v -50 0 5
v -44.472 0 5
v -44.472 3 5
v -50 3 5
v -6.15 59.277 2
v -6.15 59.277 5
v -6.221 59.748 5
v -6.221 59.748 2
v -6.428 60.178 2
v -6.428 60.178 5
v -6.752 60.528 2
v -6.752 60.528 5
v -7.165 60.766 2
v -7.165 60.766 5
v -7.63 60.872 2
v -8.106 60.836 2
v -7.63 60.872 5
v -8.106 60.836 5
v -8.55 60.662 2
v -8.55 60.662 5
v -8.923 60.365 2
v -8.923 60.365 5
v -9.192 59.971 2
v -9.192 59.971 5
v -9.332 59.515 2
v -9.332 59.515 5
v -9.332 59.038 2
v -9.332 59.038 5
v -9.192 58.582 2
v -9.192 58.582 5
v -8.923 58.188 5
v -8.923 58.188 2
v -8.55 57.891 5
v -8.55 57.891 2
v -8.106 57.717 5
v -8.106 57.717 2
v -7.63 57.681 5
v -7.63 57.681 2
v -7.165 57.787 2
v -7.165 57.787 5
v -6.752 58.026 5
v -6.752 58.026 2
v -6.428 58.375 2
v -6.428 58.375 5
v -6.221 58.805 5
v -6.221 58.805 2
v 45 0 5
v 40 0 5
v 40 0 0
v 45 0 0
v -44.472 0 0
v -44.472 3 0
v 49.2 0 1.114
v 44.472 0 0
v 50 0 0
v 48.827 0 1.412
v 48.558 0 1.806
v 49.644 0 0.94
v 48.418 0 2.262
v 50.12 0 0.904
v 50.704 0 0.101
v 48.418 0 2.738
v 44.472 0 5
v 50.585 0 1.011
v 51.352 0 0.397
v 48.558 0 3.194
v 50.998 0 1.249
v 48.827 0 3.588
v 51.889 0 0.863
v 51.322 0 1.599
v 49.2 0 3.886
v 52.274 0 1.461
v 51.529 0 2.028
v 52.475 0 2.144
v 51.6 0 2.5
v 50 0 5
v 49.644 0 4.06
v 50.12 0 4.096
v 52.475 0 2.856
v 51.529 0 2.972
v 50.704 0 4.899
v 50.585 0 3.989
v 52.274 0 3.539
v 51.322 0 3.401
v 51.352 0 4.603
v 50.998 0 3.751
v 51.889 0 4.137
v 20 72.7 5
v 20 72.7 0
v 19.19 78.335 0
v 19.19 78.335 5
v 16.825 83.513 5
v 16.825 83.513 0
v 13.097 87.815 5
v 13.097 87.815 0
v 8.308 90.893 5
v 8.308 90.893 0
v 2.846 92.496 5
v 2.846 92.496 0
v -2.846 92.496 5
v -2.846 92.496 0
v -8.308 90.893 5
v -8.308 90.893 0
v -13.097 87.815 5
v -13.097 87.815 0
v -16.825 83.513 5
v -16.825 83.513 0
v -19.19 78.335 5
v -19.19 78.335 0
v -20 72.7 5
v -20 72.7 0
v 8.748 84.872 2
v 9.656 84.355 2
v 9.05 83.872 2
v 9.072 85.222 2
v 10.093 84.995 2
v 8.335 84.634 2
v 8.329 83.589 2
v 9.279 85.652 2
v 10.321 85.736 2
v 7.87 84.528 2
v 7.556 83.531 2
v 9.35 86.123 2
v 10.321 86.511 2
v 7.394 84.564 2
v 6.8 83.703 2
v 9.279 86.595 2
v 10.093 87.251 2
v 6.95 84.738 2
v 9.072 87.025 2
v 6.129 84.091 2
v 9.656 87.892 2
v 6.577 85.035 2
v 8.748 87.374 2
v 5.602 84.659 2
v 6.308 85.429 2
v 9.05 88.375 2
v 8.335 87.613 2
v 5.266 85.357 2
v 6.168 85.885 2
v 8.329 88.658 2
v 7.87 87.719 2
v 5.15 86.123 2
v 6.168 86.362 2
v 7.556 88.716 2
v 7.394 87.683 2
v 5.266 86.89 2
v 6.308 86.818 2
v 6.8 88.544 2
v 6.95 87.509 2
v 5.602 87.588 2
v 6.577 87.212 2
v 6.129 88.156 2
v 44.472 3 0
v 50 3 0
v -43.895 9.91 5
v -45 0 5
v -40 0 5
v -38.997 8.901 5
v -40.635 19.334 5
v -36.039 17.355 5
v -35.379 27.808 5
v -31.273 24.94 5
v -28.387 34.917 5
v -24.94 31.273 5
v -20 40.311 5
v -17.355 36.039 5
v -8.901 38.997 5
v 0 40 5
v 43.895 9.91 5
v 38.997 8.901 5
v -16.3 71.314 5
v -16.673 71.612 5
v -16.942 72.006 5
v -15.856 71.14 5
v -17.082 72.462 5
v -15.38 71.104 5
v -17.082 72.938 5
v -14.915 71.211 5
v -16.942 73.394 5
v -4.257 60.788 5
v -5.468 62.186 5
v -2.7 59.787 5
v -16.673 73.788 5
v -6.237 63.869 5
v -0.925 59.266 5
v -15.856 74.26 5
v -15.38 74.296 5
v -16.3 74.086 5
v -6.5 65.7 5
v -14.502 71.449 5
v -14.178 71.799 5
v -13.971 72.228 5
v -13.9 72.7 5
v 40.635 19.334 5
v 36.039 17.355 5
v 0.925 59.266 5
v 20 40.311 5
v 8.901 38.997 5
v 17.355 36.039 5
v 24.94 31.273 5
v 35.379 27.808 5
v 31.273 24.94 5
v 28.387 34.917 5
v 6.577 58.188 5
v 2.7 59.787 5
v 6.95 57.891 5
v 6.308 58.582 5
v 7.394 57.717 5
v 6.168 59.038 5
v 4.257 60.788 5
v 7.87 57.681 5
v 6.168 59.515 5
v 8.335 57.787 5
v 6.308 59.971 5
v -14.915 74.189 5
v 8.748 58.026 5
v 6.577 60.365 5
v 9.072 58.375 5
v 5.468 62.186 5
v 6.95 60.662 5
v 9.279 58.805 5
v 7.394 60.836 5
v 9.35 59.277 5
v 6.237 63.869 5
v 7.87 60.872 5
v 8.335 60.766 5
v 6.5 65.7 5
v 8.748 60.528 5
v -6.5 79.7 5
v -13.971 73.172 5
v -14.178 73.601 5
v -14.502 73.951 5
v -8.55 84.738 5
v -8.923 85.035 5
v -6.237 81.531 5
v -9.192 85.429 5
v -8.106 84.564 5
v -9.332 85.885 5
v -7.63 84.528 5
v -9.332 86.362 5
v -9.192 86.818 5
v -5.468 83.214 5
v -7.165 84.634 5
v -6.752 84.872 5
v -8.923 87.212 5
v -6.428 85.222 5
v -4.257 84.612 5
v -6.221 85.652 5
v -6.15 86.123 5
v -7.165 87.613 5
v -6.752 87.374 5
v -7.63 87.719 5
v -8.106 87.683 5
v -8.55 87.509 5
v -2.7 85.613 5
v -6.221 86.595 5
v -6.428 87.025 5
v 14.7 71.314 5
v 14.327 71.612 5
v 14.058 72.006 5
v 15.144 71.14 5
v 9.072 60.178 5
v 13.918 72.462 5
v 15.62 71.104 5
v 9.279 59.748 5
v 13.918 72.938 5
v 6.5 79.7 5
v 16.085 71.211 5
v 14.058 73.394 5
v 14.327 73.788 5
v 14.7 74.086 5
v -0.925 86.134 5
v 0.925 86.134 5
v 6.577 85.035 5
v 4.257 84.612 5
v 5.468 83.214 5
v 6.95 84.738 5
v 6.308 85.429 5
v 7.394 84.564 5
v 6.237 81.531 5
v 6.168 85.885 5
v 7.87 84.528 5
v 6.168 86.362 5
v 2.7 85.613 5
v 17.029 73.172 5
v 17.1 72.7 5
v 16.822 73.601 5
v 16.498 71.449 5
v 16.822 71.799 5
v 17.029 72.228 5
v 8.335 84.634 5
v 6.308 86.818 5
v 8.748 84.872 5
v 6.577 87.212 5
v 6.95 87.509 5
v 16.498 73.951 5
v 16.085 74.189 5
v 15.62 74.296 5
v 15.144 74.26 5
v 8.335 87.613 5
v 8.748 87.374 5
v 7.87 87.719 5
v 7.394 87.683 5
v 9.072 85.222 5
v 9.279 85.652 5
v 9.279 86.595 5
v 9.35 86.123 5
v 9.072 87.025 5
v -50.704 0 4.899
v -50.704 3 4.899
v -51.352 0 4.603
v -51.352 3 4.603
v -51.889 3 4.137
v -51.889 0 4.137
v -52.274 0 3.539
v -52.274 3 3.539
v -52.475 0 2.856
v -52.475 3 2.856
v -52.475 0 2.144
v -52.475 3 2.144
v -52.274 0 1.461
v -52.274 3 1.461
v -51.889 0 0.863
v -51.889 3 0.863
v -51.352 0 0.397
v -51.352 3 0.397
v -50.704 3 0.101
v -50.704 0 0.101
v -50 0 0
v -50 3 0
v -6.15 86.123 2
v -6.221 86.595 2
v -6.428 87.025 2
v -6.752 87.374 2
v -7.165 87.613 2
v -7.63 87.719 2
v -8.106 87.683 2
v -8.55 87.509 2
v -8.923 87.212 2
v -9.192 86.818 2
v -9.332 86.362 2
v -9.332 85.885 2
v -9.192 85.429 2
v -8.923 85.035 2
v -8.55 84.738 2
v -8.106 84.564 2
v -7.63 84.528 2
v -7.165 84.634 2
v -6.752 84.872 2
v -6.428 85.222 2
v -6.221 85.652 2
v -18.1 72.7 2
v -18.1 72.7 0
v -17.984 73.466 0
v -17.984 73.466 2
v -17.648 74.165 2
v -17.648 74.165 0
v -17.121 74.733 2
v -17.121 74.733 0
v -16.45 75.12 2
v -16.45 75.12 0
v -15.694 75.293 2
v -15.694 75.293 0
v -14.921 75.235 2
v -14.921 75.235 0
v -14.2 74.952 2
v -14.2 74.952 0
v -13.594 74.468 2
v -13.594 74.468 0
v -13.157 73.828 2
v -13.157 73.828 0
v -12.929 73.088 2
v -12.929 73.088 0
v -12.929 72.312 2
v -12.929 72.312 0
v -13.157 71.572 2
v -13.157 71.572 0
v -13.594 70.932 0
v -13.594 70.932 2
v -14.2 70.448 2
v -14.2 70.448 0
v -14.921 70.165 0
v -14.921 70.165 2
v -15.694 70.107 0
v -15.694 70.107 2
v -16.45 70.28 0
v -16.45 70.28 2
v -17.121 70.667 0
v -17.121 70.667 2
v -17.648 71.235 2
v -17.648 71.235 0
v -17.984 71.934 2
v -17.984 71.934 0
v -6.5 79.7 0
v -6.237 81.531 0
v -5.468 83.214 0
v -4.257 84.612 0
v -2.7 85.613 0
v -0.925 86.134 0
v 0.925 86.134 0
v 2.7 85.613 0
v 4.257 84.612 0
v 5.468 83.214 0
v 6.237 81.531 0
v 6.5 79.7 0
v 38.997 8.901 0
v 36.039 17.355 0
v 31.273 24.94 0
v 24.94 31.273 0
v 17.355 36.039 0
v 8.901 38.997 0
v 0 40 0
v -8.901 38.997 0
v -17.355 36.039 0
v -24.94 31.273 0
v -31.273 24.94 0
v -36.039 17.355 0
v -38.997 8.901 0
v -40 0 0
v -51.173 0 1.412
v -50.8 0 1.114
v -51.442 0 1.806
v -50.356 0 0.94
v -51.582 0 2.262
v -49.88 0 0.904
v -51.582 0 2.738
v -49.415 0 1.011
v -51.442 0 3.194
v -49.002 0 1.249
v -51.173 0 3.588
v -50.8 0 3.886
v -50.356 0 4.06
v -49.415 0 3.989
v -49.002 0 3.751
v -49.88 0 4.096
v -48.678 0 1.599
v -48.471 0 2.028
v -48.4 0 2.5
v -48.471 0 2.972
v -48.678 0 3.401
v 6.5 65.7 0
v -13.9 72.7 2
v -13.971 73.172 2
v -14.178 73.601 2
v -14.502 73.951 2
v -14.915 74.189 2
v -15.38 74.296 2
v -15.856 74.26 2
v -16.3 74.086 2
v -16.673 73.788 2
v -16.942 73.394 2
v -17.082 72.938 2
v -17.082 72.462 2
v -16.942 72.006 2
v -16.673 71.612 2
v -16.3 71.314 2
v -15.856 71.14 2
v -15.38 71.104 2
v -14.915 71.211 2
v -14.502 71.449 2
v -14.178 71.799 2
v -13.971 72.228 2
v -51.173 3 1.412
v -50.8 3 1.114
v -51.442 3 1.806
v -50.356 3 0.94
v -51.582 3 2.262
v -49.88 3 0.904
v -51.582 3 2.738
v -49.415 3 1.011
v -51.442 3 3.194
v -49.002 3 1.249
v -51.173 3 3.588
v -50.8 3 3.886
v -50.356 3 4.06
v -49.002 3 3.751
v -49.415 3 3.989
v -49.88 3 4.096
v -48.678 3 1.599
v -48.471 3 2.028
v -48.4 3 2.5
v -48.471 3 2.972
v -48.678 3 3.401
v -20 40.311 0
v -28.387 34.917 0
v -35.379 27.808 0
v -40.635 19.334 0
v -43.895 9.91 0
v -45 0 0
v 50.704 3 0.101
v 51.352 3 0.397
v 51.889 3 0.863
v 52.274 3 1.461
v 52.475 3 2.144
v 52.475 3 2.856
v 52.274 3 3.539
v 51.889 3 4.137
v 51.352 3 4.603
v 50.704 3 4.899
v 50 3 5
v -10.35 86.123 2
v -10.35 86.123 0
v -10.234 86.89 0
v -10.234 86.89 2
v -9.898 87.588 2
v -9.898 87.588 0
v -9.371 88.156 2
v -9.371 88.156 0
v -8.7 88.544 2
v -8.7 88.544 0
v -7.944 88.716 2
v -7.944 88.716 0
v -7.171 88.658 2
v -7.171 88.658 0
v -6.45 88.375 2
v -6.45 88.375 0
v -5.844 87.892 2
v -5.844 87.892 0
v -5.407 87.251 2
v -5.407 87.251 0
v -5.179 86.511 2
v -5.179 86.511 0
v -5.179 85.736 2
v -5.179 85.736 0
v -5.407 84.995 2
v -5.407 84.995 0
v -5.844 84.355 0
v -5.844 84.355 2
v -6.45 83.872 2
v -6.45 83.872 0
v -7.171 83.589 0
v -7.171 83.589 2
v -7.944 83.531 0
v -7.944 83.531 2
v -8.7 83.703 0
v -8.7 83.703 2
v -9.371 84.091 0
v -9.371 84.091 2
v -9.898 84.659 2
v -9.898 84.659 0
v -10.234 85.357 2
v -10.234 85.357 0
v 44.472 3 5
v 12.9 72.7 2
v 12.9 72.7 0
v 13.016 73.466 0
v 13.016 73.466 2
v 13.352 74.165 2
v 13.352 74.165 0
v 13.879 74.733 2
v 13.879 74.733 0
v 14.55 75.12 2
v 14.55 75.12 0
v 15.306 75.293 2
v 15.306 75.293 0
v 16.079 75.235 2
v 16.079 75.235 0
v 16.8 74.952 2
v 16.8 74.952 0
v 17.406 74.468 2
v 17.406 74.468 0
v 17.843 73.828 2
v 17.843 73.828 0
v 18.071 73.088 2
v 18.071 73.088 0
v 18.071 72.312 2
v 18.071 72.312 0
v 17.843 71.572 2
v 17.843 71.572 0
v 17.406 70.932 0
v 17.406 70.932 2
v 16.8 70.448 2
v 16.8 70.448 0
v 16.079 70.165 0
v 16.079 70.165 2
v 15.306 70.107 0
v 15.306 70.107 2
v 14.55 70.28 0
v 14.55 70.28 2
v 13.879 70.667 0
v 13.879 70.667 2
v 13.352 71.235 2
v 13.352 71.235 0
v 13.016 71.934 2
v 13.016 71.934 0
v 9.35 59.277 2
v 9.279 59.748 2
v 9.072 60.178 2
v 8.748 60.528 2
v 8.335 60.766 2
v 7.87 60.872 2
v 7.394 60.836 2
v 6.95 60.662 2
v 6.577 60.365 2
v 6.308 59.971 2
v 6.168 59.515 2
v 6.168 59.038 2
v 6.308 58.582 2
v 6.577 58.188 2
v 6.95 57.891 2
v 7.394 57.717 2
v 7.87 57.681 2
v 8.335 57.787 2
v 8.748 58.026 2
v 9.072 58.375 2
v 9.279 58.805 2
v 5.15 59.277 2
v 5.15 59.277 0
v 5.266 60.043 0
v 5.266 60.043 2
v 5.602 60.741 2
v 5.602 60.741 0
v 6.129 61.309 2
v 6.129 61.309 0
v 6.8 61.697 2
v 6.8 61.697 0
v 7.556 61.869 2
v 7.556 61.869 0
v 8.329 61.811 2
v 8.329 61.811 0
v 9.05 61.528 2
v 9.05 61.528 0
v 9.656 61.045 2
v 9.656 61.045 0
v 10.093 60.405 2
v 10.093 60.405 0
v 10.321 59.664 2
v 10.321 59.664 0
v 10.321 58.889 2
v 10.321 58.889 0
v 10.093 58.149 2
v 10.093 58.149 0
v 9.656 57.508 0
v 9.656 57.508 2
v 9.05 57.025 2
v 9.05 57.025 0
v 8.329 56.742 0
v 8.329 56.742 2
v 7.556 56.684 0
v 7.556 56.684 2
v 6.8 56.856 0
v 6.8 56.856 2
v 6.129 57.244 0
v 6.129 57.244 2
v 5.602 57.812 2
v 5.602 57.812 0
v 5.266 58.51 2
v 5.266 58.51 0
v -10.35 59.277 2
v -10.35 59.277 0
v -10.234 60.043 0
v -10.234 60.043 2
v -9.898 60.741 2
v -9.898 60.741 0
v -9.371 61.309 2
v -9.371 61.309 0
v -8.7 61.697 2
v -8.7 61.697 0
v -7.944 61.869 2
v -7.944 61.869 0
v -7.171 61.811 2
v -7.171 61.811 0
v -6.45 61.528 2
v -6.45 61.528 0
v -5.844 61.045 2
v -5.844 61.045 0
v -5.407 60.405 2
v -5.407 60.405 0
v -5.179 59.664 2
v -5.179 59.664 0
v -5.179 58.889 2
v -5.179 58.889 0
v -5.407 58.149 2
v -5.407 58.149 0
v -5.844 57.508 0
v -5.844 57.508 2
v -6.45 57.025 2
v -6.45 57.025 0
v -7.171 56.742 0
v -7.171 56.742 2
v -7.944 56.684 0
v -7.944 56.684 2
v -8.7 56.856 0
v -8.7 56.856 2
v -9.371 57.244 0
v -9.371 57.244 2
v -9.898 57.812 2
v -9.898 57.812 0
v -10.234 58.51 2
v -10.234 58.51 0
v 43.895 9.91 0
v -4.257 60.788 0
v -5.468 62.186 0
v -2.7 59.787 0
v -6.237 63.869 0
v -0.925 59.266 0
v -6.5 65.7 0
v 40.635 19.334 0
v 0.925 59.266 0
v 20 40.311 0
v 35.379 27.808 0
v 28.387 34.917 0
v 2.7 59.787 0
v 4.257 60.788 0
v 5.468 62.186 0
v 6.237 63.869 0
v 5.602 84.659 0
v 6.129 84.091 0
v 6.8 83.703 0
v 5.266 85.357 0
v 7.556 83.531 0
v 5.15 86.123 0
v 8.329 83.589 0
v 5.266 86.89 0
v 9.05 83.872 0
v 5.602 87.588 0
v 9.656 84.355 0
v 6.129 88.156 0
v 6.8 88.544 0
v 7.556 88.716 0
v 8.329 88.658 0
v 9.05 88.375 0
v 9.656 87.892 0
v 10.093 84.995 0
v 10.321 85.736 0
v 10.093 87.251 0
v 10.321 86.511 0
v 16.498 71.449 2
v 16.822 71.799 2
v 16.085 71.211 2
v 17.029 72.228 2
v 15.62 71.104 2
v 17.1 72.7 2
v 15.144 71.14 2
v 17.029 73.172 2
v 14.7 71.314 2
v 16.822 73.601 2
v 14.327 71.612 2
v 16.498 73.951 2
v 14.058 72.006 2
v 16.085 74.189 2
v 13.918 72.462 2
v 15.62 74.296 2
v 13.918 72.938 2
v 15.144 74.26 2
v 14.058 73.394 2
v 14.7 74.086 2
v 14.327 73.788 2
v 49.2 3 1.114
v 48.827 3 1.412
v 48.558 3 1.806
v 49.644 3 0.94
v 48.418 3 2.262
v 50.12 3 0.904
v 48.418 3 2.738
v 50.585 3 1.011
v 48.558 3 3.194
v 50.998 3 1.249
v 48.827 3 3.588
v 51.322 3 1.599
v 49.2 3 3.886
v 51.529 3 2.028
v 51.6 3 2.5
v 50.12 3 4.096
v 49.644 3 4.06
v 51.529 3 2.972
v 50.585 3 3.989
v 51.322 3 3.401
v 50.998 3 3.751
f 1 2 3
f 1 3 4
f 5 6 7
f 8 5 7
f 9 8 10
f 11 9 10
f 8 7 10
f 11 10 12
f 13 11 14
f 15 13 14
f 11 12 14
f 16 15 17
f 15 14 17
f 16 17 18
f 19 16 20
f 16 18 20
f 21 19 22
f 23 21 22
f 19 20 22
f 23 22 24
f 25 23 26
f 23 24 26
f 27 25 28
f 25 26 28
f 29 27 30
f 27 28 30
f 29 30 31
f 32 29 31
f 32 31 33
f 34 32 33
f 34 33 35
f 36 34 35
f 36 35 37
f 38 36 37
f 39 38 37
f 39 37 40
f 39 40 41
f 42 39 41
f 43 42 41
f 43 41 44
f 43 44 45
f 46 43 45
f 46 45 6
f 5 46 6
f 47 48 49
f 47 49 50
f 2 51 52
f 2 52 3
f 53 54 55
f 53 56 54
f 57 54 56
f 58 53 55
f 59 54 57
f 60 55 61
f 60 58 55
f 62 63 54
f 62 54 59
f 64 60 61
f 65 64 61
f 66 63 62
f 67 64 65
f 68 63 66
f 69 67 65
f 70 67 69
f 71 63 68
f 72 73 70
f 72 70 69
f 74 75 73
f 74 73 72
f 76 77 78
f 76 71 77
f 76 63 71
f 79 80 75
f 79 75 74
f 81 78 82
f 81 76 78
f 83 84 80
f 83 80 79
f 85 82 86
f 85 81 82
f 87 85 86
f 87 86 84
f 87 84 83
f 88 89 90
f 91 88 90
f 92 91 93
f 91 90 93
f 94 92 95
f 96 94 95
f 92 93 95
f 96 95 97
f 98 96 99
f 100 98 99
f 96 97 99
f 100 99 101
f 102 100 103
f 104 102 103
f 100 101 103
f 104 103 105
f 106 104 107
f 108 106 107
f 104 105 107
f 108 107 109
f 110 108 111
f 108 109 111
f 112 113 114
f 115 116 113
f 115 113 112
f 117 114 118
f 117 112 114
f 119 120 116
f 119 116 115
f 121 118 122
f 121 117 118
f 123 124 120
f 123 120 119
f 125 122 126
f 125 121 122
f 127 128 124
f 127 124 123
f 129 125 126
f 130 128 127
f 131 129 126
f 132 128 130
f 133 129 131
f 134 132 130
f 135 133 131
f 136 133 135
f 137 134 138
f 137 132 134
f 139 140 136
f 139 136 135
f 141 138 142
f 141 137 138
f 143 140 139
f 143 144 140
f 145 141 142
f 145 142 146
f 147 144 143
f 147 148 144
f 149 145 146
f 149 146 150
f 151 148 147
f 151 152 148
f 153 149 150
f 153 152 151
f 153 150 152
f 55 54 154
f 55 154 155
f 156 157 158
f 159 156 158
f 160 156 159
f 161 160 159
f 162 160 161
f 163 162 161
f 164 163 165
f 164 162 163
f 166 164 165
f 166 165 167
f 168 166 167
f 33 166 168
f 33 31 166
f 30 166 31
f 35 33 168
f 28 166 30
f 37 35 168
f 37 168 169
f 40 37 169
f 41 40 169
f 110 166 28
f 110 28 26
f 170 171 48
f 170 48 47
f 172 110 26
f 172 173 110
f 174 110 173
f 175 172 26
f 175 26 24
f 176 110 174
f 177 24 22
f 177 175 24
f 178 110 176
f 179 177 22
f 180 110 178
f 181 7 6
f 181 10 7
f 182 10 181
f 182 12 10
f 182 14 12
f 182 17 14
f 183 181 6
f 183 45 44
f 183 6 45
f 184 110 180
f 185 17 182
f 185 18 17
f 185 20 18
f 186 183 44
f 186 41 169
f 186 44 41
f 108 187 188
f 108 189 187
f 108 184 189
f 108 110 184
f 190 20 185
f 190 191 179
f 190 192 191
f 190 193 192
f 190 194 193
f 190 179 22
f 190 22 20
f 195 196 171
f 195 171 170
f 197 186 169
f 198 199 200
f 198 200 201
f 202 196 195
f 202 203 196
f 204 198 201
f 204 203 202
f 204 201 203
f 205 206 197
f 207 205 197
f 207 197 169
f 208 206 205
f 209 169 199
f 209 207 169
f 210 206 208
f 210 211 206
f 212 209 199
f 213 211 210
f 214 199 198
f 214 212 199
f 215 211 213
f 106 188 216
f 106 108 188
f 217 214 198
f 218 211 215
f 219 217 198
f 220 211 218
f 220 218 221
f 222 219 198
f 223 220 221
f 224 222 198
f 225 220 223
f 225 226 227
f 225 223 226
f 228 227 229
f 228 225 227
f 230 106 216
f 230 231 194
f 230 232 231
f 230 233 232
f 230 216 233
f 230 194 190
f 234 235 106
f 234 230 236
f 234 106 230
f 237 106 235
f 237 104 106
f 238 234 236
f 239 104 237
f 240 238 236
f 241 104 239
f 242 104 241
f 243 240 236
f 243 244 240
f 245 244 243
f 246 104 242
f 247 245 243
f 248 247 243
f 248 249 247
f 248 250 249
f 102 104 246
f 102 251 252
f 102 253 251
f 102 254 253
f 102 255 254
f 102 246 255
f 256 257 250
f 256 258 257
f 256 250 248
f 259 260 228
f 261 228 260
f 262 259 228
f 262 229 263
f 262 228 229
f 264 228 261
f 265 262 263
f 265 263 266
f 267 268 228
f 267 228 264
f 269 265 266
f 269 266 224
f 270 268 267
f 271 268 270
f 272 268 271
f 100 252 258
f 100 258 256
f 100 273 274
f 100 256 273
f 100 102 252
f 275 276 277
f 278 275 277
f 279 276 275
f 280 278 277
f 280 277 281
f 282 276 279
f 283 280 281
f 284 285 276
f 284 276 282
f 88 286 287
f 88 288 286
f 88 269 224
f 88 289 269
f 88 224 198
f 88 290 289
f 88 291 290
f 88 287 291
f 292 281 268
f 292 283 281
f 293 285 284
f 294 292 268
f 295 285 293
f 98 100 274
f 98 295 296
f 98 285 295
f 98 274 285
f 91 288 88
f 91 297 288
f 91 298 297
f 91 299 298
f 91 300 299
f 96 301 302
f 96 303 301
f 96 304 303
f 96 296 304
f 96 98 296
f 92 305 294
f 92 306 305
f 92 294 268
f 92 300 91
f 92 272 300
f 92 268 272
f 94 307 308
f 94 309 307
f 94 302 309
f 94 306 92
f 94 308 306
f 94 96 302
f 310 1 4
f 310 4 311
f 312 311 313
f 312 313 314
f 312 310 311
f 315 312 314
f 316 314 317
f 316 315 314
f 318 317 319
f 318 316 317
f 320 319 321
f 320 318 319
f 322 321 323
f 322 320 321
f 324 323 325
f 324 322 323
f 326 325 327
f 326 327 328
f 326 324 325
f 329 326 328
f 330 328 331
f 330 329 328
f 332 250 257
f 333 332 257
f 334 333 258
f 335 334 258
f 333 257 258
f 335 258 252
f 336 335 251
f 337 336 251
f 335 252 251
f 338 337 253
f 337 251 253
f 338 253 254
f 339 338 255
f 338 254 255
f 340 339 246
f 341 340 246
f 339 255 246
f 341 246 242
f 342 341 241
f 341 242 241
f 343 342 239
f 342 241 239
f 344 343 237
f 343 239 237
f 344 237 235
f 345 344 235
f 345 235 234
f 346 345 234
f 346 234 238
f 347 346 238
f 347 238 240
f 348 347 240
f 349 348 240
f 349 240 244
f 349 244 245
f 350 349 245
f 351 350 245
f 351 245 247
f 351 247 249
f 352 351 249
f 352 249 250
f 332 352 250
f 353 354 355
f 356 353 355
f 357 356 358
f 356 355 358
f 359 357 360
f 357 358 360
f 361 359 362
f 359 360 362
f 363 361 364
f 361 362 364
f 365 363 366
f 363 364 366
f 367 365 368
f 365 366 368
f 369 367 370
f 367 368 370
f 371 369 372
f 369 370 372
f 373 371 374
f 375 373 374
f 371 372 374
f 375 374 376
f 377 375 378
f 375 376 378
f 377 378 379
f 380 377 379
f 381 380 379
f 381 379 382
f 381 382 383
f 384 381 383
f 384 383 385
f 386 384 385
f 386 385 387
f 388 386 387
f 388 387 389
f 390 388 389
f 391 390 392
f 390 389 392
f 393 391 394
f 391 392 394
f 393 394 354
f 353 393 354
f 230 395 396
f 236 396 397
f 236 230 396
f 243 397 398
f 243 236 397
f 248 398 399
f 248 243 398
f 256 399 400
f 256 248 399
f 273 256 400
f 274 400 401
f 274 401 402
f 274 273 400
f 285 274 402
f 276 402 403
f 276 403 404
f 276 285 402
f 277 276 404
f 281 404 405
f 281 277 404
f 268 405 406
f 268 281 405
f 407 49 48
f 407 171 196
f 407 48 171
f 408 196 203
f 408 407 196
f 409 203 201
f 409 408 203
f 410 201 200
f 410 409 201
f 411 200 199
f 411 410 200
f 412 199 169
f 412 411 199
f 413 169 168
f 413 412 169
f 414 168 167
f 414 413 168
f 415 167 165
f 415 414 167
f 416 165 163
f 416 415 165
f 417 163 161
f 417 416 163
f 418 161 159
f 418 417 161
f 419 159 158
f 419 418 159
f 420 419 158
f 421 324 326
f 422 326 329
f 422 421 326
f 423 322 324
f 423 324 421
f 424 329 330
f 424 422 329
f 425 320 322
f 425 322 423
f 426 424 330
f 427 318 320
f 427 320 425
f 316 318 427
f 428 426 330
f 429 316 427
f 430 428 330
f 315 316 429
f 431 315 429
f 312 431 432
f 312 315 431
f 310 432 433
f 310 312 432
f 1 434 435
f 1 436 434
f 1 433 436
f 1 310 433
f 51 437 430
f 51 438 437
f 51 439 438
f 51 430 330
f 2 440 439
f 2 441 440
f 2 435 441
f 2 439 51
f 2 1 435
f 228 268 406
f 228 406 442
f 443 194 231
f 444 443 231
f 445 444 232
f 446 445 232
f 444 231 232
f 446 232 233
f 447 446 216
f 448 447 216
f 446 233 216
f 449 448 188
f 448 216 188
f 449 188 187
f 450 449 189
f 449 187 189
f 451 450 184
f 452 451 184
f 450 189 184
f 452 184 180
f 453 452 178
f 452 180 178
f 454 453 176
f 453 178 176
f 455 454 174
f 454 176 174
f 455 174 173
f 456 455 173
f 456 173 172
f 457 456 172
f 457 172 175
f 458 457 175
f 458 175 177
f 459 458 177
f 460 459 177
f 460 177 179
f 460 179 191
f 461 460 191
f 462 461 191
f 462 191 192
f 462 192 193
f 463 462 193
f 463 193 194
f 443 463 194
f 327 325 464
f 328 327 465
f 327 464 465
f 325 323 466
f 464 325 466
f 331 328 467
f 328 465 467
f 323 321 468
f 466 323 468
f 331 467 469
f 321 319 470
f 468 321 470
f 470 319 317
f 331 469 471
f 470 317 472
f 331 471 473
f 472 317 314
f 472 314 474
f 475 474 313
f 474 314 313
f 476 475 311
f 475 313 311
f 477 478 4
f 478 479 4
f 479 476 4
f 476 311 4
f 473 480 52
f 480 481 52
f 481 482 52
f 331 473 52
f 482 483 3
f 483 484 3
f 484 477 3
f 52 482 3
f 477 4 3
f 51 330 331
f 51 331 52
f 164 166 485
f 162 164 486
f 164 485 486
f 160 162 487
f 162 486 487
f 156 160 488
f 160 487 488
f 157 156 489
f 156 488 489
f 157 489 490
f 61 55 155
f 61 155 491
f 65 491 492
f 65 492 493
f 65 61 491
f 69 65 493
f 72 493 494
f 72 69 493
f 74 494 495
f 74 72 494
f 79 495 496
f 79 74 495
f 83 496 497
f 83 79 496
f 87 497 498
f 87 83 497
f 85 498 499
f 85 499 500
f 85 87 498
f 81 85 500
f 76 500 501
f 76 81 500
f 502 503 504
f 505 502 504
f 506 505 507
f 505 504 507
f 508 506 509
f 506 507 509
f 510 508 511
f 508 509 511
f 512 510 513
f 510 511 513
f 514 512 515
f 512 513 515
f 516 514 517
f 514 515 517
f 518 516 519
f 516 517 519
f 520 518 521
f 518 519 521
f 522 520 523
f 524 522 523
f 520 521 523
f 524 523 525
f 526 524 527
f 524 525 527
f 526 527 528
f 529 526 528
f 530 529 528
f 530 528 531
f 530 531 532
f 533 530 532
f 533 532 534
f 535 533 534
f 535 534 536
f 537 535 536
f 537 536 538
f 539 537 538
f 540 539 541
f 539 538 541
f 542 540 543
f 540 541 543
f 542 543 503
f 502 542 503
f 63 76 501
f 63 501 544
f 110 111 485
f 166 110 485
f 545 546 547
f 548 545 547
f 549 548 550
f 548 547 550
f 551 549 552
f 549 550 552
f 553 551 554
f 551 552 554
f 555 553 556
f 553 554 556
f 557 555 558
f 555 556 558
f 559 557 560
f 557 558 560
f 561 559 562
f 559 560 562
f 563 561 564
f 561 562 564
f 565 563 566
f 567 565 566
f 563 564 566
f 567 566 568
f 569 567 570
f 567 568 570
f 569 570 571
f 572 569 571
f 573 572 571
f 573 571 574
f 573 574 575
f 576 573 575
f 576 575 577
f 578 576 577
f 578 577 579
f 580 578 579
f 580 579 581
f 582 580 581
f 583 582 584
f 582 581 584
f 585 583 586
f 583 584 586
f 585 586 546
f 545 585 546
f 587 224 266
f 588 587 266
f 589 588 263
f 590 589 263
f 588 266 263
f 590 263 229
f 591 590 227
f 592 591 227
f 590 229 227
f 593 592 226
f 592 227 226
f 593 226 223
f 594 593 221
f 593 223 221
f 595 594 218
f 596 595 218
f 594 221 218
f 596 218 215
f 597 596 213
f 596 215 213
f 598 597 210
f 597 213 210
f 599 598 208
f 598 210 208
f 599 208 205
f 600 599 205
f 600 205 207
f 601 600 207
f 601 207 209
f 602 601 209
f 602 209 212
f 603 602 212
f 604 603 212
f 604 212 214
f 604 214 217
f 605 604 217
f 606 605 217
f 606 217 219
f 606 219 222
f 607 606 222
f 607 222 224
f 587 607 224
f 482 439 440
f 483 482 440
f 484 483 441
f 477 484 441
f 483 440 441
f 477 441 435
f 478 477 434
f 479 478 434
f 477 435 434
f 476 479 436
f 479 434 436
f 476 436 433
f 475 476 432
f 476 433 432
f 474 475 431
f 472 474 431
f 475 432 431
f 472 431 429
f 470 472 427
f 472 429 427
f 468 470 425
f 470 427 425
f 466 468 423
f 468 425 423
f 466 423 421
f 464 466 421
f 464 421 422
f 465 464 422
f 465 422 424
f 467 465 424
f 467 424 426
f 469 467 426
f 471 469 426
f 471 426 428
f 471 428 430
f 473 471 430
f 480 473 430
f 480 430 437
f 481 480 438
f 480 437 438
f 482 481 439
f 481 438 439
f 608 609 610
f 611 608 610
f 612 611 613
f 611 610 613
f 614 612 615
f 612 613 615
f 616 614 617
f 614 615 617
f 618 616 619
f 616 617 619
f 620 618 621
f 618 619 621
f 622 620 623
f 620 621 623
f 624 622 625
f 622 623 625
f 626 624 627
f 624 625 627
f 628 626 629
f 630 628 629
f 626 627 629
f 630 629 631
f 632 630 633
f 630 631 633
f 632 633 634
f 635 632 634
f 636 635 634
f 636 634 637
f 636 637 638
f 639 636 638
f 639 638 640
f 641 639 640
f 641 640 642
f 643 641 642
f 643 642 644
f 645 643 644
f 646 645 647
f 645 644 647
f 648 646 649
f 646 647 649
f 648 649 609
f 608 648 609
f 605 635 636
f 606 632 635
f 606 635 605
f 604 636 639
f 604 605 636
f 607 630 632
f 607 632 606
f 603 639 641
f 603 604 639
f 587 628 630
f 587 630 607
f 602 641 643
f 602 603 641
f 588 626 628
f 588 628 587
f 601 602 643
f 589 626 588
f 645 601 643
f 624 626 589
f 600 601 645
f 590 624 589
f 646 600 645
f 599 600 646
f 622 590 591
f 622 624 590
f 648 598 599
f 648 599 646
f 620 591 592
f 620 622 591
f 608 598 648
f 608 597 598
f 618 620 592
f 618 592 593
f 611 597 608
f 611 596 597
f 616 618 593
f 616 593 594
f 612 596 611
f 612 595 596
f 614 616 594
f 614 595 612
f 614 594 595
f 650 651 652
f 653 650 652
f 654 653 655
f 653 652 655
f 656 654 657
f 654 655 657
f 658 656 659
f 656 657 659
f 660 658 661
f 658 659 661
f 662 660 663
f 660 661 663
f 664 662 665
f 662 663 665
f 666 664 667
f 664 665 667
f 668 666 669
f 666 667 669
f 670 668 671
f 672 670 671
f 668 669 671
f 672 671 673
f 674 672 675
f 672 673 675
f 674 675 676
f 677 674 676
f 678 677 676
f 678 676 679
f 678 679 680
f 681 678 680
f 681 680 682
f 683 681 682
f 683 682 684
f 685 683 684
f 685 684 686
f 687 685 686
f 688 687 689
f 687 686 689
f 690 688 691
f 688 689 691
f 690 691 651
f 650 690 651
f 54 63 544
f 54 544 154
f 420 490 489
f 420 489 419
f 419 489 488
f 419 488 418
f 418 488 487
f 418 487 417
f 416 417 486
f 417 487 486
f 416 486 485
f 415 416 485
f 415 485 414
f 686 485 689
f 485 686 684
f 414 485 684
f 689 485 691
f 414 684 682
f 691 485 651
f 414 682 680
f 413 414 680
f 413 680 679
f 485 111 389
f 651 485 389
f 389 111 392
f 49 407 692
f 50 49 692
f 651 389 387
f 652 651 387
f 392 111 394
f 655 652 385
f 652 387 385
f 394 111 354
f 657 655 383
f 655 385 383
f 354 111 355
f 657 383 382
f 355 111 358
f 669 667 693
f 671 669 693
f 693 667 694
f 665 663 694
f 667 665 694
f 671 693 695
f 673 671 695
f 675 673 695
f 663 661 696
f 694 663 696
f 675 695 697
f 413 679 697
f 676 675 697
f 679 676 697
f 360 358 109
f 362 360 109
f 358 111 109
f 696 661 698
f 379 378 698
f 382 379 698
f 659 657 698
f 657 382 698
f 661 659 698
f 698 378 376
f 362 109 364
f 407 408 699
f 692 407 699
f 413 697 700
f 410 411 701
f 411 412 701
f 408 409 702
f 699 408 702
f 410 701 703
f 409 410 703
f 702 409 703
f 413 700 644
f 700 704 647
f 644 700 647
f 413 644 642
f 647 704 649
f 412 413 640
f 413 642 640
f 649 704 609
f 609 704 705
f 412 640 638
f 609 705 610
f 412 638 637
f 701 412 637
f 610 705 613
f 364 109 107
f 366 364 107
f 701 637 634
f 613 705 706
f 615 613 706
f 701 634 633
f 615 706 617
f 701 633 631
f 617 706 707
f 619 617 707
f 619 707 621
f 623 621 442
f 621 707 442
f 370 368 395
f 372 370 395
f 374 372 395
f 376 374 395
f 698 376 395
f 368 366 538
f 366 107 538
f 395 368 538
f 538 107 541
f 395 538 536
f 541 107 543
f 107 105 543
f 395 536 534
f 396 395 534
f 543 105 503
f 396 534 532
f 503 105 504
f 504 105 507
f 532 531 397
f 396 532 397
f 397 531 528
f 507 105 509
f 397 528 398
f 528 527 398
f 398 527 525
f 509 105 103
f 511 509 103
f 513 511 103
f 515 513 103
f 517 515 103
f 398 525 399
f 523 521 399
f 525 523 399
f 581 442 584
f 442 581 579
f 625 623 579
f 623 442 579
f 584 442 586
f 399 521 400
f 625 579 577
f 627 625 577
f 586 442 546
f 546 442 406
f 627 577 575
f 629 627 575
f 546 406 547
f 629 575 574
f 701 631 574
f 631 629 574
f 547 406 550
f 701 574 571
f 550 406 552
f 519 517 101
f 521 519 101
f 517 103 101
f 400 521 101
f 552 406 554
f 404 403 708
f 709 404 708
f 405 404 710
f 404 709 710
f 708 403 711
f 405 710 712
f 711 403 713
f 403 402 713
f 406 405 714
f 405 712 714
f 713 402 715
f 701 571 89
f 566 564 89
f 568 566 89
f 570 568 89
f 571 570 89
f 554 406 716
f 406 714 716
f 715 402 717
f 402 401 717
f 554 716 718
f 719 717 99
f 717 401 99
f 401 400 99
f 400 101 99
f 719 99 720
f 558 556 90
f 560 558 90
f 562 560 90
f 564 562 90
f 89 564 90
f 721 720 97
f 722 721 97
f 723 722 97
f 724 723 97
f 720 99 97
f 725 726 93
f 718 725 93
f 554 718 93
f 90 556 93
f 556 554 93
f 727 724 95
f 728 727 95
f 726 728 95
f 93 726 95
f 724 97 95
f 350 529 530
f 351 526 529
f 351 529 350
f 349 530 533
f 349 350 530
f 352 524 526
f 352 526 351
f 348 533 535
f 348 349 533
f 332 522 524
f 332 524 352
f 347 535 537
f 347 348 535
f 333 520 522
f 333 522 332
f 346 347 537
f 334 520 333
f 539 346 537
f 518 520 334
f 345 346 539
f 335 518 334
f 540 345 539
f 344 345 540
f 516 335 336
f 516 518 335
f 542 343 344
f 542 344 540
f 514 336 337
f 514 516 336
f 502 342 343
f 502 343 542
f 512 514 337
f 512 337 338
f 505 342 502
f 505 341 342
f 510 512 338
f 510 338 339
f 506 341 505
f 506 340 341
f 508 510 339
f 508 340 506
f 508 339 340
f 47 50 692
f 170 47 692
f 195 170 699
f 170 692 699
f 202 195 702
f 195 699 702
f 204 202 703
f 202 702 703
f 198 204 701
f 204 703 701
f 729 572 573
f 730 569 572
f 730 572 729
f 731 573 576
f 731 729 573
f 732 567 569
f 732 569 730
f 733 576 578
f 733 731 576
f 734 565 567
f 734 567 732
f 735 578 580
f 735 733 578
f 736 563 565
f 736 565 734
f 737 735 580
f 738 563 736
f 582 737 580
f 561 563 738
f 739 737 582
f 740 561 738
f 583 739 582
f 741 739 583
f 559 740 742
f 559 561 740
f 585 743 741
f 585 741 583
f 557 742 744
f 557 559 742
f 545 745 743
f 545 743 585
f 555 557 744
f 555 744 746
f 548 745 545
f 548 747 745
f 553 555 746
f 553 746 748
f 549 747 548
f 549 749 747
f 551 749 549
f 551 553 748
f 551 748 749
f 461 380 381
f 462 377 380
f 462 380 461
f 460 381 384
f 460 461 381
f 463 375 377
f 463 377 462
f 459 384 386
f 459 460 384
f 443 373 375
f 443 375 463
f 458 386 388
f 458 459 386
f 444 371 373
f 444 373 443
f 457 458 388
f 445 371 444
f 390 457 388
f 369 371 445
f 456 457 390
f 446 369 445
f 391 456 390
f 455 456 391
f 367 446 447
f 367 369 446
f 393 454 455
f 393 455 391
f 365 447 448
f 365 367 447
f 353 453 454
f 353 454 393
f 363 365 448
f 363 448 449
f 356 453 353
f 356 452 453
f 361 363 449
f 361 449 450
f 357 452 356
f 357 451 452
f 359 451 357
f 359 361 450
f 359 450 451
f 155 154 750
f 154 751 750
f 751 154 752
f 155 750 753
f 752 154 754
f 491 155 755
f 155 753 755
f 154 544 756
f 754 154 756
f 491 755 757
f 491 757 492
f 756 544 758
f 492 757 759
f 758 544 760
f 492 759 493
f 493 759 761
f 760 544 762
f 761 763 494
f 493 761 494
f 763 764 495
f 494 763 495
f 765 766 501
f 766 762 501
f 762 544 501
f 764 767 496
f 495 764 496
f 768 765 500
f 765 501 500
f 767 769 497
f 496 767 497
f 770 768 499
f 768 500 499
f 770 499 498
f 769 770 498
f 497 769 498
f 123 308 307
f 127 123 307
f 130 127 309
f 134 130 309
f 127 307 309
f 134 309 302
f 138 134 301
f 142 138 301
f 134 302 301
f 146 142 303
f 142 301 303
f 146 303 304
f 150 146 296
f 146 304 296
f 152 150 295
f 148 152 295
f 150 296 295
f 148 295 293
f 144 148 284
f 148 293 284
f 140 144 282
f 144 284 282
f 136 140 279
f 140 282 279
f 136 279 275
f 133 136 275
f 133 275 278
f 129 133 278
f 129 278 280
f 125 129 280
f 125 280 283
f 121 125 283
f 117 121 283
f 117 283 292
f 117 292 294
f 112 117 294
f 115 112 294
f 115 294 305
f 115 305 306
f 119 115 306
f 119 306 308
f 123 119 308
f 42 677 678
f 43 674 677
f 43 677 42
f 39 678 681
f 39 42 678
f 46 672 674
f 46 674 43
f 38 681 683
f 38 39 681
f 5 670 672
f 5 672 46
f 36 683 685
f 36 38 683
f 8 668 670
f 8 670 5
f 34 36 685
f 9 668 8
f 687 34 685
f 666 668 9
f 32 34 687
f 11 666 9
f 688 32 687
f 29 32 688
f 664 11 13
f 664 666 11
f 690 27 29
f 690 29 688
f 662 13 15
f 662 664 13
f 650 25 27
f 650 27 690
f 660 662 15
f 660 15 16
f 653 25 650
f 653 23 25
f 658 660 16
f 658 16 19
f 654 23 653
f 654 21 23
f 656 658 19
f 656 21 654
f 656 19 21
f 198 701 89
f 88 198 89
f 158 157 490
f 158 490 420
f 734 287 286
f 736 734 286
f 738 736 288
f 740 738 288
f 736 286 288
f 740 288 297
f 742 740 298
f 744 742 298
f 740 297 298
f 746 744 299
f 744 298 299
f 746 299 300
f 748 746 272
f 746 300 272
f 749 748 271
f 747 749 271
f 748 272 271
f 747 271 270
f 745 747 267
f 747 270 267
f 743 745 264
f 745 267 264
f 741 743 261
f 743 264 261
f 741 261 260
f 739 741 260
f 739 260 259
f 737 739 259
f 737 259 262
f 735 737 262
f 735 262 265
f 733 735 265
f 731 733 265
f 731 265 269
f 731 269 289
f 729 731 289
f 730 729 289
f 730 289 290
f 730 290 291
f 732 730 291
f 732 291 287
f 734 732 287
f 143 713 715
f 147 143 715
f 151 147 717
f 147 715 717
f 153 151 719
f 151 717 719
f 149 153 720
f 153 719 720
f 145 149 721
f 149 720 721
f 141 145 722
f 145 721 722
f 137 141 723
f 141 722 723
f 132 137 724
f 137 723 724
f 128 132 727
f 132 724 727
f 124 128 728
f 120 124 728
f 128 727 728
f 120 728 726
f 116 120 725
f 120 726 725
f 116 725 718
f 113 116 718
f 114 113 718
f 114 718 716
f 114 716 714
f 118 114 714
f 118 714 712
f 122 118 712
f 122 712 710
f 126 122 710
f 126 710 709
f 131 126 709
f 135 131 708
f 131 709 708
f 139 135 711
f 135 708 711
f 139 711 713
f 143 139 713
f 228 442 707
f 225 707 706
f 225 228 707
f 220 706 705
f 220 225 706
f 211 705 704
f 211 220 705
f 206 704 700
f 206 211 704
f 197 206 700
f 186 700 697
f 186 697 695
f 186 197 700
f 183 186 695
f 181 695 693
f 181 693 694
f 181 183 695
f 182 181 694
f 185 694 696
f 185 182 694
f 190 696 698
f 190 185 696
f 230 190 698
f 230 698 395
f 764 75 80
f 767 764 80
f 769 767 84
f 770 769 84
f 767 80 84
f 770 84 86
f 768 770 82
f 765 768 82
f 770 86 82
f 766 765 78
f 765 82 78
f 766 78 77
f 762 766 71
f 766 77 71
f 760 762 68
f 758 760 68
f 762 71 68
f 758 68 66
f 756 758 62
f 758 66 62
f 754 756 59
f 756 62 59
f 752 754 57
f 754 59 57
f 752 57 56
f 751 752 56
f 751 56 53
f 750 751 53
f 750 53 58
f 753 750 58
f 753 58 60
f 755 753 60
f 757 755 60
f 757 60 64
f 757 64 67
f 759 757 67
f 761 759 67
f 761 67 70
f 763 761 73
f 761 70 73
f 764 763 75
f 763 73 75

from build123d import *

# Parameters (mm, degrees)
SKETCH_1_R               = 40
EXTRUDE_1_DEPTH          = 5
SKETCH_2_R               = 1.6
CUT_EXTRUDE_1_DEPTH      = 5
SKETCH_3_R               = 2.6
CUT_EXTRUDE_2_DEPTH      = 2
SKETCH_4_W               = 99.26232013
SKETCH_4_H               = 51.828911565
CUT_EXTRUDE_3_DEPTH      = 1
CUT_EXTRUDE_3_DEPTH_BACK = 6
SKETCH_5_R               = 1.6
EXTRUDE_2_DEPTH          = 3
EXTRUDE_2_2_DEPTH        = 3


with BuildPart() as part:
    # 草图1 → 凸台-拉伸1 (new body)
    with BuildSketch(Plane.XY):
        with BuildLine():
            Line((-20, 72.7), (-20, 40.311288741))
            ThreePointArc((-20, 40.311288741), (0, -45), (20, 40.311288741))
            Line((20, 40.311288741), (20, 72.7))
            ThreePointArc((20, 72.7), (0, 92.7), (-20, 72.7))
        make_face()
        Circle(SKETCH_1_R, mode=Mode.SUBTRACT)
    extrude(amount=EXTRUDE_1_DEPTH)

    # 草图2 → 切除-拉伸1 (cut, symmetric)
    with BuildSketch(Plane.XY.offset(5)):
        with Locations((-7.75, 86.123393759)):
            Circle(SKETCH_2_R)
        with Locations((7.75, 86.123393759)):
            Circle(SKETCH_2_R)
        with Locations((15.5, 72.7)):
            Circle(SKETCH_2_R)
        with Locations((7.75, 59.276606241)):
            Circle(SKETCH_2_R)
        with Locations((-7.75, 59.276606241)):
            Circle(SKETCH_2_R)
        with Locations((-15.5, 72.7)):
            Circle(SKETCH_2_R)
        with BuildLine():
            Line((6.5, 79.7), (6.5, 65.7))
            ThreePointArc((6.5, 65.7), (0, 59.2), (-6.5, 65.7))
            Line((-6.5, 65.7), (-6.5, 79.7))
            ThreePointArc((-6.5, 79.7), (0, 86.2), (6.5, 79.7))
        make_face()
    extrude(amount=CUT_EXTRUDE_1_DEPTH, both=True, mode=Mode.SUBTRACT)

    # 草图3 → 切除-拉伸2 (cut)
    with BuildSketch(Plane(origin=(0, 0, 0), x_dir=(-1, 0, 0), z_dir=(0, 0, -1))):
        with Locations((-7.75, 86.123393759)):
            Circle(SKETCH_3_R)
        with Locations((7.75, 86.123393759)):
            Circle(SKETCH_3_R)
        with Locations((15.5, 72.7)):
            Circle(SKETCH_3_R)
        with Locations((7.75, 59.276606241)):
            Circle(SKETCH_3_R)
        with Locations((-7.75, 59.276606241)):
            Circle(SKETCH_3_R)
        with Locations((-15.5, 72.7)):
            Circle(SKETCH_3_R)
    extrude(amount=-CUT_EXTRUDE_2_DEPTH, mode=Mode.SUBTRACT)

    # 草图4 → 切除-拉伸3 (cut, two sides)
    with BuildSketch(Plane.XY.offset(5)) as cut_extrude_3_sk:
        with Locations((4.631160065, -25.914455783)):
            Rectangle(SKETCH_4_W, SKETCH_4_H)
    extrude(amount=CUT_EXTRUDE_3_DEPTH, mode=Mode.SUBTRACT)
    extrude(cut_extrude_3_sk.sketch, amount=-CUT_EXTRUDE_3_DEPTH_BACK, mode=Mode.SUBTRACT)


with BuildPart() as body_2:
    # 草图5 → 凸台-拉伸2 (new body)
    with BuildSketch(Plane.XZ):
        with BuildLine():
            Line((-44.472472542, 5.000003), (-50, 5.000003))
            ThreePointArc((-50, 5.000003), (-52.5, 2.500003), (-50, 3e-06))
            Line((-50, 3e-06), (-44.472472542, 3e-06))
            Line((-44.472472542, 3e-06), (-44.472472542, 5.000003))
        make_face()
        with Locations((-50, 2.500003)):
            Circle(SKETCH_5_R, mode=Mode.SUBTRACT)
    extrude(amount=-EXTRUDE_2_DEPTH)


with BuildPart() as body_3:
    # 草图5 → Extrude 2 2 (new body)
    with BuildSketch(Plane.XZ):
        with BuildLine():
            Line((44.472472542, 3e-06), (50, 3e-06))
            ThreePointArc((50, 3e-06), (52.5, 2.500003), (50, 5.000003))
            Line((50, 5.000003), (44.472472542, 5.000003))
            Line((44.472472542, 5.000003), (44.472472542, 3e-06))
        make_face()
        with Locations((50, 2.500003)):
            Circle(SKETCH_5_R, mode=Mode.SUBTRACT)
    extrude(amount=-EXTRUDE_2_2_DEPTH)


solid = Compound([part.part, body_2.part, body_3.part])
